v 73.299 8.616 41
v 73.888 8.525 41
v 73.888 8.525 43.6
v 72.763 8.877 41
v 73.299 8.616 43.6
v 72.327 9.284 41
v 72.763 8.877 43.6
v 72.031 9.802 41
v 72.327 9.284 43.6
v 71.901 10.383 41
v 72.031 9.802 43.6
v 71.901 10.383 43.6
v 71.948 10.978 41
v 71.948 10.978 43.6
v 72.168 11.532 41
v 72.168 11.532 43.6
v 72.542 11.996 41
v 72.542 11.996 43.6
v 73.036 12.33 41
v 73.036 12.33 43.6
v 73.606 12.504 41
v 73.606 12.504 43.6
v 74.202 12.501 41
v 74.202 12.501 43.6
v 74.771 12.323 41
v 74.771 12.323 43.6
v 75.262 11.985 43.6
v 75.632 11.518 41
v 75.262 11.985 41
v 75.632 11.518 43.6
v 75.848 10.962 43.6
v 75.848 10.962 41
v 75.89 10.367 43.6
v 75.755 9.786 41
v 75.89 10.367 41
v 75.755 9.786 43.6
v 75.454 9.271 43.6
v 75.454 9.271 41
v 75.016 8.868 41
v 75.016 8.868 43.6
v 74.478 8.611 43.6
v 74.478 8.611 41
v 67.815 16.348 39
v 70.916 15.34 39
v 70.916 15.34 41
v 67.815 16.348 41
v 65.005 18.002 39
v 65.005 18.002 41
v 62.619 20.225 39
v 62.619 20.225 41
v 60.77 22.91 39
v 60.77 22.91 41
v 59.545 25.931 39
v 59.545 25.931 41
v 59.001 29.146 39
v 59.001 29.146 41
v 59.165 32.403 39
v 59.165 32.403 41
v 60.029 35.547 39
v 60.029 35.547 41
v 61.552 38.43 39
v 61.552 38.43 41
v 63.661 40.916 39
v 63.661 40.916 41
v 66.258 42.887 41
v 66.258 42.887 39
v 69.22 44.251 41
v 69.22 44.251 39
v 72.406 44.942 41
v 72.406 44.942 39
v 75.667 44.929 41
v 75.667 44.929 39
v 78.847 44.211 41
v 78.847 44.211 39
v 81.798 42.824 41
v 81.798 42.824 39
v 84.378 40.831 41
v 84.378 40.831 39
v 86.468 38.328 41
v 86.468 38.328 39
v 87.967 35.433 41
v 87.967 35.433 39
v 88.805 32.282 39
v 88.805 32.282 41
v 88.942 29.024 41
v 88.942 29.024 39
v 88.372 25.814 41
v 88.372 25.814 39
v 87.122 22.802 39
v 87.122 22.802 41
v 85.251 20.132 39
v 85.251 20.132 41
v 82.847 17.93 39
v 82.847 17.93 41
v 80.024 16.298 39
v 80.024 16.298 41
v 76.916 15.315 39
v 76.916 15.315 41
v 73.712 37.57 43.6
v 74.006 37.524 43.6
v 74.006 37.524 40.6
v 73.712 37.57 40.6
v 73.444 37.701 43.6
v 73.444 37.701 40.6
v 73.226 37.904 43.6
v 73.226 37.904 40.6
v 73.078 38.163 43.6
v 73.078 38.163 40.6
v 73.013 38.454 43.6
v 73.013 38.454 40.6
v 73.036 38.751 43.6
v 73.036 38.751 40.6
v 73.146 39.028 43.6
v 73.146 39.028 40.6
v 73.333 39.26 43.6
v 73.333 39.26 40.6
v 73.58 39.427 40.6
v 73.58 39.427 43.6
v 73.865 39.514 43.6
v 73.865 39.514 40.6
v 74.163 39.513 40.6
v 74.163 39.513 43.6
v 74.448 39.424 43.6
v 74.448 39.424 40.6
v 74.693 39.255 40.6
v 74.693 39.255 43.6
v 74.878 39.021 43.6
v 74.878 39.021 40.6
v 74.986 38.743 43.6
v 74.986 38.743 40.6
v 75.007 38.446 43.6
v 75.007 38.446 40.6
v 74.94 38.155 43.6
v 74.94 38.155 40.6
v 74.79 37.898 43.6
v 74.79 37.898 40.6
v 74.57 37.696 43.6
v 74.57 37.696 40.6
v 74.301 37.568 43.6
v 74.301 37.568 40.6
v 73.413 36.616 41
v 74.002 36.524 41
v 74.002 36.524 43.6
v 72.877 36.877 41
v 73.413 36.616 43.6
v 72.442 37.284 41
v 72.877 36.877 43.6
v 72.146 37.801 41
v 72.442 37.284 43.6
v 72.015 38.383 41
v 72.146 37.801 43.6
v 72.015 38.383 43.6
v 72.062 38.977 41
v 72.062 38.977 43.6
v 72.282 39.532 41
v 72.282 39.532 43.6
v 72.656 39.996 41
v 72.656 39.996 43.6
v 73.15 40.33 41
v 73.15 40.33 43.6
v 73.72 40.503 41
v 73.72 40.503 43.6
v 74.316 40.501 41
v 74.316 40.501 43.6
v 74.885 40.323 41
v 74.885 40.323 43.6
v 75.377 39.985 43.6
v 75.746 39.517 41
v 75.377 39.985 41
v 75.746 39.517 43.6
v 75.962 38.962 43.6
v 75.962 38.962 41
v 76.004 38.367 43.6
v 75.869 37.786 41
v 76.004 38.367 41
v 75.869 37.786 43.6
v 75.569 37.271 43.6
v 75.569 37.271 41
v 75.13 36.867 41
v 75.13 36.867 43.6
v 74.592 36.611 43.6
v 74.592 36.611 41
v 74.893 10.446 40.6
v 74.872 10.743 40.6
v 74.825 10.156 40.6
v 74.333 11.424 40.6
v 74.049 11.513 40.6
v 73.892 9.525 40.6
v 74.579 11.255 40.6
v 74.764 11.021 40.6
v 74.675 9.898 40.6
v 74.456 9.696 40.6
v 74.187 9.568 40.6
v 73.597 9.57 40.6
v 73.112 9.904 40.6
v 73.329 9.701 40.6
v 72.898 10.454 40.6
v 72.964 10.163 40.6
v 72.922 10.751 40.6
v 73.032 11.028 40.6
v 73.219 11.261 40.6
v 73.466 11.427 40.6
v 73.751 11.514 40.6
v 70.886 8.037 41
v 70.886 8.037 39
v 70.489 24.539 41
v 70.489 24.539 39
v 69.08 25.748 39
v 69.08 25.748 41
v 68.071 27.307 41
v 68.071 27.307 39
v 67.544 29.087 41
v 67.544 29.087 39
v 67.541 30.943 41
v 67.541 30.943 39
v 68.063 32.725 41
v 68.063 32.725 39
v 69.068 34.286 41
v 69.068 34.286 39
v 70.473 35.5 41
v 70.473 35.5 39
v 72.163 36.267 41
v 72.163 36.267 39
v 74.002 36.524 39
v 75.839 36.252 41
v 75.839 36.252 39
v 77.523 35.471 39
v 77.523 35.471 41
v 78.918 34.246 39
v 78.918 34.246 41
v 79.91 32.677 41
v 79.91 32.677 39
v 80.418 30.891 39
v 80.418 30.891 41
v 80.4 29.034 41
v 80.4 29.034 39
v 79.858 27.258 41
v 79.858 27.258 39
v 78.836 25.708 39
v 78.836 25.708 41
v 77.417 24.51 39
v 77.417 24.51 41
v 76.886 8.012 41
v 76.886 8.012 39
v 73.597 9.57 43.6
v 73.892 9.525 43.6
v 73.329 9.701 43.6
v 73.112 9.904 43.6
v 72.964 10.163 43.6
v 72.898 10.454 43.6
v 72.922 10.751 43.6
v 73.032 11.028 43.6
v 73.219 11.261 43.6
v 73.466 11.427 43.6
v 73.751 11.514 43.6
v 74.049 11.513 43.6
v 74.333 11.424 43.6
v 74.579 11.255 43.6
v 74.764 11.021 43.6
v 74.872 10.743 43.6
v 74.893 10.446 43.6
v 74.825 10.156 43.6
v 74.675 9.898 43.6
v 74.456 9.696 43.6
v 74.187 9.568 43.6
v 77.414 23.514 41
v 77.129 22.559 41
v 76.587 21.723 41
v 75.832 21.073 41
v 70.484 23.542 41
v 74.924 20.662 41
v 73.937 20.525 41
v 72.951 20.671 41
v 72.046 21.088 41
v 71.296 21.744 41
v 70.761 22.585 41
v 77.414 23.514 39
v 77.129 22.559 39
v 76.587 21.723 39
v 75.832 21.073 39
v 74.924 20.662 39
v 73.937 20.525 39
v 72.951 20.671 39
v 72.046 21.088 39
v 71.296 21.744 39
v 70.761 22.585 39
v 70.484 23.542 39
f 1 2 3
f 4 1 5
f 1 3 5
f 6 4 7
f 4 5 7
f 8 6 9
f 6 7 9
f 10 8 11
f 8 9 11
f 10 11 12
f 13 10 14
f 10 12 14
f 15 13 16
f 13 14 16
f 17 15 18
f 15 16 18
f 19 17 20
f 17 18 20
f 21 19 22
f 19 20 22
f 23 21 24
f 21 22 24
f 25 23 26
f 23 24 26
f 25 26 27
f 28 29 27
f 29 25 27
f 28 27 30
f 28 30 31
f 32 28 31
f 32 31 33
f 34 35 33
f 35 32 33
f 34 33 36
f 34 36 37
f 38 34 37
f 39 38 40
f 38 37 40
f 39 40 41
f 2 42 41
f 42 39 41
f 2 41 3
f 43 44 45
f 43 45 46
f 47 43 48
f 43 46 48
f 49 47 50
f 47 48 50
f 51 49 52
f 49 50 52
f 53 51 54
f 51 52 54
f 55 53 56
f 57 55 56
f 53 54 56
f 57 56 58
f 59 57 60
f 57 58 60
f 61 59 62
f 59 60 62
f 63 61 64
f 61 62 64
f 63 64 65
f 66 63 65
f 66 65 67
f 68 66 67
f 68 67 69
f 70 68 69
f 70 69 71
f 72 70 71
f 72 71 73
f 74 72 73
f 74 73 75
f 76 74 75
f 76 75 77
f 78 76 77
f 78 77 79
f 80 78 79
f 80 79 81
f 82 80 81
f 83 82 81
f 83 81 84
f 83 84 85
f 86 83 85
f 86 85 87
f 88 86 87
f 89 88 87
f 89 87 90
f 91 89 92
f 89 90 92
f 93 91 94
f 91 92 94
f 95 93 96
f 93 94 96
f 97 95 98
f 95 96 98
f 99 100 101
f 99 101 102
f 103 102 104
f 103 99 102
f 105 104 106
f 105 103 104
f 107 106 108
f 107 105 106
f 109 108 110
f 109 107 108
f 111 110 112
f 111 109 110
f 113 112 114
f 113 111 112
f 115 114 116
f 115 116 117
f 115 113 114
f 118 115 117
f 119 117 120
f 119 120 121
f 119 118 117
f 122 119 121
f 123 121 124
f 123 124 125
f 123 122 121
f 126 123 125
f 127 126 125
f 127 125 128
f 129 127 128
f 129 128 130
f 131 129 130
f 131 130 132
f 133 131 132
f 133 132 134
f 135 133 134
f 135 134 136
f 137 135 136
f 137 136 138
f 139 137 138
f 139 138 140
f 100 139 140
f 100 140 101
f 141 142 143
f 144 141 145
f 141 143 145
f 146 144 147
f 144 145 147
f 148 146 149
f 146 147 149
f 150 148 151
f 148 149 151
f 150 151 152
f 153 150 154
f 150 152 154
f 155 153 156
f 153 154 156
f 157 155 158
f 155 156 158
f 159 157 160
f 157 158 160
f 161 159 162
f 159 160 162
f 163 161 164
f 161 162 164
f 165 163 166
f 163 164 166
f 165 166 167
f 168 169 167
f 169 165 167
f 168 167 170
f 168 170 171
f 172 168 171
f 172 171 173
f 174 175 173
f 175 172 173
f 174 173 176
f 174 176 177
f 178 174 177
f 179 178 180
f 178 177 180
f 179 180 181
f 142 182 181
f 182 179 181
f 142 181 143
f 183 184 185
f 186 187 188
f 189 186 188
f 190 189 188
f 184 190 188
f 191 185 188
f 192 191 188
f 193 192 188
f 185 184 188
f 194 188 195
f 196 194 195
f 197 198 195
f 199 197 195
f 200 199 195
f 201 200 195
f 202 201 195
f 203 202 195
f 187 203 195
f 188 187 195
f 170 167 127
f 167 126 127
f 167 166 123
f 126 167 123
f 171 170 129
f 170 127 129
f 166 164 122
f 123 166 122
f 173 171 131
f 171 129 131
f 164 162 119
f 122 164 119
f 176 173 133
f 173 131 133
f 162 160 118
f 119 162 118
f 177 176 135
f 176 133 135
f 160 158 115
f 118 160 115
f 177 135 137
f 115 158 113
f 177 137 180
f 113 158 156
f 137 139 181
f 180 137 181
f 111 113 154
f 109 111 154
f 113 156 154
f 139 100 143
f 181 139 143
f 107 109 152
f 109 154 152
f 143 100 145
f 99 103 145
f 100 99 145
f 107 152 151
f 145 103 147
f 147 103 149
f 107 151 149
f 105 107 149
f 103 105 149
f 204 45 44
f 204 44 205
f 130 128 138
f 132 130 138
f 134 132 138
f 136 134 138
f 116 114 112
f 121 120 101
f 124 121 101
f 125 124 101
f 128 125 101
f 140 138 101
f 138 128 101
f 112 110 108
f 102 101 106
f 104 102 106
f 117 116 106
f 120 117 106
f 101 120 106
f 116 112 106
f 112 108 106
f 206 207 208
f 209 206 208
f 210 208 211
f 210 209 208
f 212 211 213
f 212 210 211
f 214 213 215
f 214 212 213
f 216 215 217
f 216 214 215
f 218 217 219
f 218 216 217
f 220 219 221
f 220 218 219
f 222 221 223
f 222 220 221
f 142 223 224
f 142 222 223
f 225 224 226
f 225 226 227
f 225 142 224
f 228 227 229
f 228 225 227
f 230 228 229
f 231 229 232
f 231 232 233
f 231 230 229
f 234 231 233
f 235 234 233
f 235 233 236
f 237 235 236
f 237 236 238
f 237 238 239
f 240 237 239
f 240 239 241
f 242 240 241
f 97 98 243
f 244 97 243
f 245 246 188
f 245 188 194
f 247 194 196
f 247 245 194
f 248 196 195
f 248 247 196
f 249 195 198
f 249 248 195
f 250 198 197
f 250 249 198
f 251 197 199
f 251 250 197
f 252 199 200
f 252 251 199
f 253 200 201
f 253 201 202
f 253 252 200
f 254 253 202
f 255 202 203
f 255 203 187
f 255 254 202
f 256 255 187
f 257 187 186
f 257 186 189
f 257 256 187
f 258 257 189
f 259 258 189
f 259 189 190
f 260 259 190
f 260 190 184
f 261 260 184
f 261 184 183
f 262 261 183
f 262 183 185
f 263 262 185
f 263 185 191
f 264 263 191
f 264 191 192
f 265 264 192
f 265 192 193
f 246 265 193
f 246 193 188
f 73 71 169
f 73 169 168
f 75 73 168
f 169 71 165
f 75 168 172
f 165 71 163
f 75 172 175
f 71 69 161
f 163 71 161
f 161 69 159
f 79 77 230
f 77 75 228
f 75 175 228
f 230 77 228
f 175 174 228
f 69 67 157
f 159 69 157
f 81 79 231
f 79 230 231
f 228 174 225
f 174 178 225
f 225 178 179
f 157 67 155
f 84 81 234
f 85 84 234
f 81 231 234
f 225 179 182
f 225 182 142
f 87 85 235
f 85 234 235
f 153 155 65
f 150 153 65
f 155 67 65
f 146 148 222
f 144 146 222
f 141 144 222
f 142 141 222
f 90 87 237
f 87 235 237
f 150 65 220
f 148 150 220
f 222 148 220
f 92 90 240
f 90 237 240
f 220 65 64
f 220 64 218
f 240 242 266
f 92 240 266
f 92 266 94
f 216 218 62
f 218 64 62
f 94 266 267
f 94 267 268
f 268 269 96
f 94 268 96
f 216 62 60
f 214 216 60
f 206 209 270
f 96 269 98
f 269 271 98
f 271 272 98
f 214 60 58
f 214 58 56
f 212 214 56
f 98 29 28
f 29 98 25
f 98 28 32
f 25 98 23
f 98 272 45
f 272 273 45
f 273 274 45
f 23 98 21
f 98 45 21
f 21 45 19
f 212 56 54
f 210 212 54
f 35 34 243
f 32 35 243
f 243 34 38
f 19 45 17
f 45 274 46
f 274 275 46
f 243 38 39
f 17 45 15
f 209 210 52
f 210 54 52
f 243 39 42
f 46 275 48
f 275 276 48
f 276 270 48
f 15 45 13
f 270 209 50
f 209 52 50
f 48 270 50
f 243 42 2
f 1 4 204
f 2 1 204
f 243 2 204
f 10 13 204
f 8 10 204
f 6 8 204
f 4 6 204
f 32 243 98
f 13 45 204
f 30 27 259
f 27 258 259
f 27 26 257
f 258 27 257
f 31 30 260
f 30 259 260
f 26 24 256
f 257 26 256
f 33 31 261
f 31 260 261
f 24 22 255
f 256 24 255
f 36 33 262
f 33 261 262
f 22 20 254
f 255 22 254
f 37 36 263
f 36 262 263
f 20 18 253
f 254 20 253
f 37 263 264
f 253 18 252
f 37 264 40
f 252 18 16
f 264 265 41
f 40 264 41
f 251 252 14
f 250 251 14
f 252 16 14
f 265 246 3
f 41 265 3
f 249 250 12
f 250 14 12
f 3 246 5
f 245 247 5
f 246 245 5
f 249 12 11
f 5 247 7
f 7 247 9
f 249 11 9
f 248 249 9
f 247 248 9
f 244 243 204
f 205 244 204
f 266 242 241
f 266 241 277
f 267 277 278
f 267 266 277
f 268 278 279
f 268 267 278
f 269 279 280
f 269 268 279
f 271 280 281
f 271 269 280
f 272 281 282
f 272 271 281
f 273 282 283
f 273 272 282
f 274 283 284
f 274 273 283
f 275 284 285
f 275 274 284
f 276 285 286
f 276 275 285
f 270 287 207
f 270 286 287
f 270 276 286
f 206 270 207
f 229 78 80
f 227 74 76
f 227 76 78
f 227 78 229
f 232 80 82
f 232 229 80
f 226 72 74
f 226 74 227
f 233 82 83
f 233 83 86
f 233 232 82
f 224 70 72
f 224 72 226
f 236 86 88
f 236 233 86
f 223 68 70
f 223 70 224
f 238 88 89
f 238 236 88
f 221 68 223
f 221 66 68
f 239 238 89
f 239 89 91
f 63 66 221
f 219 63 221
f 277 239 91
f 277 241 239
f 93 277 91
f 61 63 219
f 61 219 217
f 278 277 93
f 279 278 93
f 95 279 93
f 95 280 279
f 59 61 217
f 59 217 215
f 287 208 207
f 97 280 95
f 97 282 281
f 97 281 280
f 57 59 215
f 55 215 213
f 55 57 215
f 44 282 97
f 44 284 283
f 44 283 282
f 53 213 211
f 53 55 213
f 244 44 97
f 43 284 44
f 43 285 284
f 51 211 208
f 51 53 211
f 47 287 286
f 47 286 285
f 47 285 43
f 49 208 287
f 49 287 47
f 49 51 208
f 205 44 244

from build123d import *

# Parameters (mm, degrees)
CYLINDER003001001005001001_R     = 3.5
CYLINDER003001001005001001_DEPTH = 2
CYLINDER003001001004002_R        = 1
CYLINDER003001001004002_DEPTH    = 5
CYLINDER003001001004001001_R     = 1
CYLINDER003001001004001001_DEPTH = 5
CYLINDER003001001005001_R        = 6.5
CYLINDER003001001005001_DEPTH    = 2
BOX002_W                         = 10
BOX002_H                         = 6
BOX002_DEPTH                     = 2
CYLINDER003001001004_R           = 2
CYLINDER003001001004_DEPTH       = 3
CYLINDER003001001004001_R        = 2
CYLINDER003001001004001_DEPTH    = 3
CYLINDER003001001005_R           = 15
CYLINDER003001001005_DEPTH       = 2
CUT002_ROLL_ANGLE                = 180
CUT002_PLACEMENT_ANGLE           = -90.233929


with BuildPart() as cylinder013:
    # Cylinder003001001005001001 → Cylinder003001001005001001 (new body)
    with BuildSketch(Plane(origin=(12, 6, 21), x_dir=(1, 0, 0), z_dir=(0, 0, 1))):
        Circle(CYLINDER003001001005001001_R)
    extrude(amount=CYLINDER003001001005001001_DEPTH)


with BuildPart() as cylinder014:
    # Cylinder003001001004002 → Cylinder003001001004002 (new body)
    with BuildSketch(Plane(origin=(-2.5, 6, 16.4), x_dir=(1, 0, 0), z_dir=(0, 0, 1))):
        Circle(CYLINDER003001001004002_R)
    extrude(amount=CYLINDER003001001004002_DEPTH)


with BuildPart() as cylinder015:
    # Cylinder003001001004001001 → Cylinder003001001004001001 (new body)
    with BuildSketch(Plane(origin=(25.5, 6, 16.4), x_dir=(1, 0, 0), z_dir=(0, 0, 1))):
        Circle(CYLINDER003001001004001001_R)
    extrude(amount=CYLINDER003001001004001001_DEPTH)


with BuildPart() as fusion009:
    # Cylinder003001001005001 → Cylinder003001001005001 (new body)
    with BuildSketch(Plane(origin=(6, 6, 21), x_dir=(1, 0, 0), z_dir=(0, 0, 1))):
        Circle(CYLINDER003001001005001_R)
    extrude(amount=CYLINDER003001001005001_DEPTH)

    # Fusion009: union Cylinder013, Cylinder014, Cylinder015
    add(cylinder013.part)
    add(cylinder014.part)
    add(cylinder015.part)


with BuildPart() as box002:
    # Box002 → Box002 (new body)
    with BuildSketch(Plane(origin=(18, 3, 21), x_dir=(1, 0, 0), z_dir=(0, 0, 1))):
        with Locations((5, 3)):
            Rectangle(BOX002_W, BOX002_H)
    extrude(amount=BOX002_DEPTH)


with BuildPart() as cylinder003001001004:
    # Cylinder003001001004 → Cylinder003001001004 (new body)
    with BuildSketch(Plane(origin=(-2.5, 6, 18.4), x_dir=(1, 0, 0), z_dir=(0, 0, 1))):
        Circle(CYLINDER003001001004_R)
    extrude(amount=CYLINDER003001001004_DEPTH)


with BuildPart() as cylinder010:
    # Cylinder003001001004001 → Cylinder003001001004001 (new body)
    with BuildSketch(Plane(origin=(25.5, 6, 18.4), x_dir=(1, 0, 0), z_dir=(0, 0, 1))):
        Circle(CYLINDER003001001004001_R)
    extrude(amount=CYLINDER003001001004001_DEPTH)


with BuildPart() as guide1:
    # Cylinder003001001005 → Cylinder003001001005 (new body)
    with BuildSketch(Plane(origin=(6, 6, 21), x_dir=(1, 0, 0), z_dir=(0, 0, 1))):
        Circle(CYLINDER003001001005_R)
    extrude(amount=CYLINDER003001001005_DEPTH)

    # Fusion008: union Box002, Cylinder003001001004, Cylinder010
    add(box002.part)
    add(cylinder003001001004.part)
    add(cylinder010.part)

    # Cut002: cut Fusion009
    add(fusion009.part, mode=Mode.SUBTRACT)


with BuildPart() as guide1_1:
    # Cut002 roll: moved
    add(guide1.part.rotate(Axis((0, 0, 0), (1, 0, 0)), CUT002_ROLL_ANGLE))


with BuildPart() as guide1_2:
    # Cut002 placement: moved
    add(guide1_1.part.moved(Location((80, 36, 62))).rotate(Axis((80, 36, 62), (0, 0, 1)), CUT002_PLACEMENT_ANGLE))


solid = guide1_2.part
